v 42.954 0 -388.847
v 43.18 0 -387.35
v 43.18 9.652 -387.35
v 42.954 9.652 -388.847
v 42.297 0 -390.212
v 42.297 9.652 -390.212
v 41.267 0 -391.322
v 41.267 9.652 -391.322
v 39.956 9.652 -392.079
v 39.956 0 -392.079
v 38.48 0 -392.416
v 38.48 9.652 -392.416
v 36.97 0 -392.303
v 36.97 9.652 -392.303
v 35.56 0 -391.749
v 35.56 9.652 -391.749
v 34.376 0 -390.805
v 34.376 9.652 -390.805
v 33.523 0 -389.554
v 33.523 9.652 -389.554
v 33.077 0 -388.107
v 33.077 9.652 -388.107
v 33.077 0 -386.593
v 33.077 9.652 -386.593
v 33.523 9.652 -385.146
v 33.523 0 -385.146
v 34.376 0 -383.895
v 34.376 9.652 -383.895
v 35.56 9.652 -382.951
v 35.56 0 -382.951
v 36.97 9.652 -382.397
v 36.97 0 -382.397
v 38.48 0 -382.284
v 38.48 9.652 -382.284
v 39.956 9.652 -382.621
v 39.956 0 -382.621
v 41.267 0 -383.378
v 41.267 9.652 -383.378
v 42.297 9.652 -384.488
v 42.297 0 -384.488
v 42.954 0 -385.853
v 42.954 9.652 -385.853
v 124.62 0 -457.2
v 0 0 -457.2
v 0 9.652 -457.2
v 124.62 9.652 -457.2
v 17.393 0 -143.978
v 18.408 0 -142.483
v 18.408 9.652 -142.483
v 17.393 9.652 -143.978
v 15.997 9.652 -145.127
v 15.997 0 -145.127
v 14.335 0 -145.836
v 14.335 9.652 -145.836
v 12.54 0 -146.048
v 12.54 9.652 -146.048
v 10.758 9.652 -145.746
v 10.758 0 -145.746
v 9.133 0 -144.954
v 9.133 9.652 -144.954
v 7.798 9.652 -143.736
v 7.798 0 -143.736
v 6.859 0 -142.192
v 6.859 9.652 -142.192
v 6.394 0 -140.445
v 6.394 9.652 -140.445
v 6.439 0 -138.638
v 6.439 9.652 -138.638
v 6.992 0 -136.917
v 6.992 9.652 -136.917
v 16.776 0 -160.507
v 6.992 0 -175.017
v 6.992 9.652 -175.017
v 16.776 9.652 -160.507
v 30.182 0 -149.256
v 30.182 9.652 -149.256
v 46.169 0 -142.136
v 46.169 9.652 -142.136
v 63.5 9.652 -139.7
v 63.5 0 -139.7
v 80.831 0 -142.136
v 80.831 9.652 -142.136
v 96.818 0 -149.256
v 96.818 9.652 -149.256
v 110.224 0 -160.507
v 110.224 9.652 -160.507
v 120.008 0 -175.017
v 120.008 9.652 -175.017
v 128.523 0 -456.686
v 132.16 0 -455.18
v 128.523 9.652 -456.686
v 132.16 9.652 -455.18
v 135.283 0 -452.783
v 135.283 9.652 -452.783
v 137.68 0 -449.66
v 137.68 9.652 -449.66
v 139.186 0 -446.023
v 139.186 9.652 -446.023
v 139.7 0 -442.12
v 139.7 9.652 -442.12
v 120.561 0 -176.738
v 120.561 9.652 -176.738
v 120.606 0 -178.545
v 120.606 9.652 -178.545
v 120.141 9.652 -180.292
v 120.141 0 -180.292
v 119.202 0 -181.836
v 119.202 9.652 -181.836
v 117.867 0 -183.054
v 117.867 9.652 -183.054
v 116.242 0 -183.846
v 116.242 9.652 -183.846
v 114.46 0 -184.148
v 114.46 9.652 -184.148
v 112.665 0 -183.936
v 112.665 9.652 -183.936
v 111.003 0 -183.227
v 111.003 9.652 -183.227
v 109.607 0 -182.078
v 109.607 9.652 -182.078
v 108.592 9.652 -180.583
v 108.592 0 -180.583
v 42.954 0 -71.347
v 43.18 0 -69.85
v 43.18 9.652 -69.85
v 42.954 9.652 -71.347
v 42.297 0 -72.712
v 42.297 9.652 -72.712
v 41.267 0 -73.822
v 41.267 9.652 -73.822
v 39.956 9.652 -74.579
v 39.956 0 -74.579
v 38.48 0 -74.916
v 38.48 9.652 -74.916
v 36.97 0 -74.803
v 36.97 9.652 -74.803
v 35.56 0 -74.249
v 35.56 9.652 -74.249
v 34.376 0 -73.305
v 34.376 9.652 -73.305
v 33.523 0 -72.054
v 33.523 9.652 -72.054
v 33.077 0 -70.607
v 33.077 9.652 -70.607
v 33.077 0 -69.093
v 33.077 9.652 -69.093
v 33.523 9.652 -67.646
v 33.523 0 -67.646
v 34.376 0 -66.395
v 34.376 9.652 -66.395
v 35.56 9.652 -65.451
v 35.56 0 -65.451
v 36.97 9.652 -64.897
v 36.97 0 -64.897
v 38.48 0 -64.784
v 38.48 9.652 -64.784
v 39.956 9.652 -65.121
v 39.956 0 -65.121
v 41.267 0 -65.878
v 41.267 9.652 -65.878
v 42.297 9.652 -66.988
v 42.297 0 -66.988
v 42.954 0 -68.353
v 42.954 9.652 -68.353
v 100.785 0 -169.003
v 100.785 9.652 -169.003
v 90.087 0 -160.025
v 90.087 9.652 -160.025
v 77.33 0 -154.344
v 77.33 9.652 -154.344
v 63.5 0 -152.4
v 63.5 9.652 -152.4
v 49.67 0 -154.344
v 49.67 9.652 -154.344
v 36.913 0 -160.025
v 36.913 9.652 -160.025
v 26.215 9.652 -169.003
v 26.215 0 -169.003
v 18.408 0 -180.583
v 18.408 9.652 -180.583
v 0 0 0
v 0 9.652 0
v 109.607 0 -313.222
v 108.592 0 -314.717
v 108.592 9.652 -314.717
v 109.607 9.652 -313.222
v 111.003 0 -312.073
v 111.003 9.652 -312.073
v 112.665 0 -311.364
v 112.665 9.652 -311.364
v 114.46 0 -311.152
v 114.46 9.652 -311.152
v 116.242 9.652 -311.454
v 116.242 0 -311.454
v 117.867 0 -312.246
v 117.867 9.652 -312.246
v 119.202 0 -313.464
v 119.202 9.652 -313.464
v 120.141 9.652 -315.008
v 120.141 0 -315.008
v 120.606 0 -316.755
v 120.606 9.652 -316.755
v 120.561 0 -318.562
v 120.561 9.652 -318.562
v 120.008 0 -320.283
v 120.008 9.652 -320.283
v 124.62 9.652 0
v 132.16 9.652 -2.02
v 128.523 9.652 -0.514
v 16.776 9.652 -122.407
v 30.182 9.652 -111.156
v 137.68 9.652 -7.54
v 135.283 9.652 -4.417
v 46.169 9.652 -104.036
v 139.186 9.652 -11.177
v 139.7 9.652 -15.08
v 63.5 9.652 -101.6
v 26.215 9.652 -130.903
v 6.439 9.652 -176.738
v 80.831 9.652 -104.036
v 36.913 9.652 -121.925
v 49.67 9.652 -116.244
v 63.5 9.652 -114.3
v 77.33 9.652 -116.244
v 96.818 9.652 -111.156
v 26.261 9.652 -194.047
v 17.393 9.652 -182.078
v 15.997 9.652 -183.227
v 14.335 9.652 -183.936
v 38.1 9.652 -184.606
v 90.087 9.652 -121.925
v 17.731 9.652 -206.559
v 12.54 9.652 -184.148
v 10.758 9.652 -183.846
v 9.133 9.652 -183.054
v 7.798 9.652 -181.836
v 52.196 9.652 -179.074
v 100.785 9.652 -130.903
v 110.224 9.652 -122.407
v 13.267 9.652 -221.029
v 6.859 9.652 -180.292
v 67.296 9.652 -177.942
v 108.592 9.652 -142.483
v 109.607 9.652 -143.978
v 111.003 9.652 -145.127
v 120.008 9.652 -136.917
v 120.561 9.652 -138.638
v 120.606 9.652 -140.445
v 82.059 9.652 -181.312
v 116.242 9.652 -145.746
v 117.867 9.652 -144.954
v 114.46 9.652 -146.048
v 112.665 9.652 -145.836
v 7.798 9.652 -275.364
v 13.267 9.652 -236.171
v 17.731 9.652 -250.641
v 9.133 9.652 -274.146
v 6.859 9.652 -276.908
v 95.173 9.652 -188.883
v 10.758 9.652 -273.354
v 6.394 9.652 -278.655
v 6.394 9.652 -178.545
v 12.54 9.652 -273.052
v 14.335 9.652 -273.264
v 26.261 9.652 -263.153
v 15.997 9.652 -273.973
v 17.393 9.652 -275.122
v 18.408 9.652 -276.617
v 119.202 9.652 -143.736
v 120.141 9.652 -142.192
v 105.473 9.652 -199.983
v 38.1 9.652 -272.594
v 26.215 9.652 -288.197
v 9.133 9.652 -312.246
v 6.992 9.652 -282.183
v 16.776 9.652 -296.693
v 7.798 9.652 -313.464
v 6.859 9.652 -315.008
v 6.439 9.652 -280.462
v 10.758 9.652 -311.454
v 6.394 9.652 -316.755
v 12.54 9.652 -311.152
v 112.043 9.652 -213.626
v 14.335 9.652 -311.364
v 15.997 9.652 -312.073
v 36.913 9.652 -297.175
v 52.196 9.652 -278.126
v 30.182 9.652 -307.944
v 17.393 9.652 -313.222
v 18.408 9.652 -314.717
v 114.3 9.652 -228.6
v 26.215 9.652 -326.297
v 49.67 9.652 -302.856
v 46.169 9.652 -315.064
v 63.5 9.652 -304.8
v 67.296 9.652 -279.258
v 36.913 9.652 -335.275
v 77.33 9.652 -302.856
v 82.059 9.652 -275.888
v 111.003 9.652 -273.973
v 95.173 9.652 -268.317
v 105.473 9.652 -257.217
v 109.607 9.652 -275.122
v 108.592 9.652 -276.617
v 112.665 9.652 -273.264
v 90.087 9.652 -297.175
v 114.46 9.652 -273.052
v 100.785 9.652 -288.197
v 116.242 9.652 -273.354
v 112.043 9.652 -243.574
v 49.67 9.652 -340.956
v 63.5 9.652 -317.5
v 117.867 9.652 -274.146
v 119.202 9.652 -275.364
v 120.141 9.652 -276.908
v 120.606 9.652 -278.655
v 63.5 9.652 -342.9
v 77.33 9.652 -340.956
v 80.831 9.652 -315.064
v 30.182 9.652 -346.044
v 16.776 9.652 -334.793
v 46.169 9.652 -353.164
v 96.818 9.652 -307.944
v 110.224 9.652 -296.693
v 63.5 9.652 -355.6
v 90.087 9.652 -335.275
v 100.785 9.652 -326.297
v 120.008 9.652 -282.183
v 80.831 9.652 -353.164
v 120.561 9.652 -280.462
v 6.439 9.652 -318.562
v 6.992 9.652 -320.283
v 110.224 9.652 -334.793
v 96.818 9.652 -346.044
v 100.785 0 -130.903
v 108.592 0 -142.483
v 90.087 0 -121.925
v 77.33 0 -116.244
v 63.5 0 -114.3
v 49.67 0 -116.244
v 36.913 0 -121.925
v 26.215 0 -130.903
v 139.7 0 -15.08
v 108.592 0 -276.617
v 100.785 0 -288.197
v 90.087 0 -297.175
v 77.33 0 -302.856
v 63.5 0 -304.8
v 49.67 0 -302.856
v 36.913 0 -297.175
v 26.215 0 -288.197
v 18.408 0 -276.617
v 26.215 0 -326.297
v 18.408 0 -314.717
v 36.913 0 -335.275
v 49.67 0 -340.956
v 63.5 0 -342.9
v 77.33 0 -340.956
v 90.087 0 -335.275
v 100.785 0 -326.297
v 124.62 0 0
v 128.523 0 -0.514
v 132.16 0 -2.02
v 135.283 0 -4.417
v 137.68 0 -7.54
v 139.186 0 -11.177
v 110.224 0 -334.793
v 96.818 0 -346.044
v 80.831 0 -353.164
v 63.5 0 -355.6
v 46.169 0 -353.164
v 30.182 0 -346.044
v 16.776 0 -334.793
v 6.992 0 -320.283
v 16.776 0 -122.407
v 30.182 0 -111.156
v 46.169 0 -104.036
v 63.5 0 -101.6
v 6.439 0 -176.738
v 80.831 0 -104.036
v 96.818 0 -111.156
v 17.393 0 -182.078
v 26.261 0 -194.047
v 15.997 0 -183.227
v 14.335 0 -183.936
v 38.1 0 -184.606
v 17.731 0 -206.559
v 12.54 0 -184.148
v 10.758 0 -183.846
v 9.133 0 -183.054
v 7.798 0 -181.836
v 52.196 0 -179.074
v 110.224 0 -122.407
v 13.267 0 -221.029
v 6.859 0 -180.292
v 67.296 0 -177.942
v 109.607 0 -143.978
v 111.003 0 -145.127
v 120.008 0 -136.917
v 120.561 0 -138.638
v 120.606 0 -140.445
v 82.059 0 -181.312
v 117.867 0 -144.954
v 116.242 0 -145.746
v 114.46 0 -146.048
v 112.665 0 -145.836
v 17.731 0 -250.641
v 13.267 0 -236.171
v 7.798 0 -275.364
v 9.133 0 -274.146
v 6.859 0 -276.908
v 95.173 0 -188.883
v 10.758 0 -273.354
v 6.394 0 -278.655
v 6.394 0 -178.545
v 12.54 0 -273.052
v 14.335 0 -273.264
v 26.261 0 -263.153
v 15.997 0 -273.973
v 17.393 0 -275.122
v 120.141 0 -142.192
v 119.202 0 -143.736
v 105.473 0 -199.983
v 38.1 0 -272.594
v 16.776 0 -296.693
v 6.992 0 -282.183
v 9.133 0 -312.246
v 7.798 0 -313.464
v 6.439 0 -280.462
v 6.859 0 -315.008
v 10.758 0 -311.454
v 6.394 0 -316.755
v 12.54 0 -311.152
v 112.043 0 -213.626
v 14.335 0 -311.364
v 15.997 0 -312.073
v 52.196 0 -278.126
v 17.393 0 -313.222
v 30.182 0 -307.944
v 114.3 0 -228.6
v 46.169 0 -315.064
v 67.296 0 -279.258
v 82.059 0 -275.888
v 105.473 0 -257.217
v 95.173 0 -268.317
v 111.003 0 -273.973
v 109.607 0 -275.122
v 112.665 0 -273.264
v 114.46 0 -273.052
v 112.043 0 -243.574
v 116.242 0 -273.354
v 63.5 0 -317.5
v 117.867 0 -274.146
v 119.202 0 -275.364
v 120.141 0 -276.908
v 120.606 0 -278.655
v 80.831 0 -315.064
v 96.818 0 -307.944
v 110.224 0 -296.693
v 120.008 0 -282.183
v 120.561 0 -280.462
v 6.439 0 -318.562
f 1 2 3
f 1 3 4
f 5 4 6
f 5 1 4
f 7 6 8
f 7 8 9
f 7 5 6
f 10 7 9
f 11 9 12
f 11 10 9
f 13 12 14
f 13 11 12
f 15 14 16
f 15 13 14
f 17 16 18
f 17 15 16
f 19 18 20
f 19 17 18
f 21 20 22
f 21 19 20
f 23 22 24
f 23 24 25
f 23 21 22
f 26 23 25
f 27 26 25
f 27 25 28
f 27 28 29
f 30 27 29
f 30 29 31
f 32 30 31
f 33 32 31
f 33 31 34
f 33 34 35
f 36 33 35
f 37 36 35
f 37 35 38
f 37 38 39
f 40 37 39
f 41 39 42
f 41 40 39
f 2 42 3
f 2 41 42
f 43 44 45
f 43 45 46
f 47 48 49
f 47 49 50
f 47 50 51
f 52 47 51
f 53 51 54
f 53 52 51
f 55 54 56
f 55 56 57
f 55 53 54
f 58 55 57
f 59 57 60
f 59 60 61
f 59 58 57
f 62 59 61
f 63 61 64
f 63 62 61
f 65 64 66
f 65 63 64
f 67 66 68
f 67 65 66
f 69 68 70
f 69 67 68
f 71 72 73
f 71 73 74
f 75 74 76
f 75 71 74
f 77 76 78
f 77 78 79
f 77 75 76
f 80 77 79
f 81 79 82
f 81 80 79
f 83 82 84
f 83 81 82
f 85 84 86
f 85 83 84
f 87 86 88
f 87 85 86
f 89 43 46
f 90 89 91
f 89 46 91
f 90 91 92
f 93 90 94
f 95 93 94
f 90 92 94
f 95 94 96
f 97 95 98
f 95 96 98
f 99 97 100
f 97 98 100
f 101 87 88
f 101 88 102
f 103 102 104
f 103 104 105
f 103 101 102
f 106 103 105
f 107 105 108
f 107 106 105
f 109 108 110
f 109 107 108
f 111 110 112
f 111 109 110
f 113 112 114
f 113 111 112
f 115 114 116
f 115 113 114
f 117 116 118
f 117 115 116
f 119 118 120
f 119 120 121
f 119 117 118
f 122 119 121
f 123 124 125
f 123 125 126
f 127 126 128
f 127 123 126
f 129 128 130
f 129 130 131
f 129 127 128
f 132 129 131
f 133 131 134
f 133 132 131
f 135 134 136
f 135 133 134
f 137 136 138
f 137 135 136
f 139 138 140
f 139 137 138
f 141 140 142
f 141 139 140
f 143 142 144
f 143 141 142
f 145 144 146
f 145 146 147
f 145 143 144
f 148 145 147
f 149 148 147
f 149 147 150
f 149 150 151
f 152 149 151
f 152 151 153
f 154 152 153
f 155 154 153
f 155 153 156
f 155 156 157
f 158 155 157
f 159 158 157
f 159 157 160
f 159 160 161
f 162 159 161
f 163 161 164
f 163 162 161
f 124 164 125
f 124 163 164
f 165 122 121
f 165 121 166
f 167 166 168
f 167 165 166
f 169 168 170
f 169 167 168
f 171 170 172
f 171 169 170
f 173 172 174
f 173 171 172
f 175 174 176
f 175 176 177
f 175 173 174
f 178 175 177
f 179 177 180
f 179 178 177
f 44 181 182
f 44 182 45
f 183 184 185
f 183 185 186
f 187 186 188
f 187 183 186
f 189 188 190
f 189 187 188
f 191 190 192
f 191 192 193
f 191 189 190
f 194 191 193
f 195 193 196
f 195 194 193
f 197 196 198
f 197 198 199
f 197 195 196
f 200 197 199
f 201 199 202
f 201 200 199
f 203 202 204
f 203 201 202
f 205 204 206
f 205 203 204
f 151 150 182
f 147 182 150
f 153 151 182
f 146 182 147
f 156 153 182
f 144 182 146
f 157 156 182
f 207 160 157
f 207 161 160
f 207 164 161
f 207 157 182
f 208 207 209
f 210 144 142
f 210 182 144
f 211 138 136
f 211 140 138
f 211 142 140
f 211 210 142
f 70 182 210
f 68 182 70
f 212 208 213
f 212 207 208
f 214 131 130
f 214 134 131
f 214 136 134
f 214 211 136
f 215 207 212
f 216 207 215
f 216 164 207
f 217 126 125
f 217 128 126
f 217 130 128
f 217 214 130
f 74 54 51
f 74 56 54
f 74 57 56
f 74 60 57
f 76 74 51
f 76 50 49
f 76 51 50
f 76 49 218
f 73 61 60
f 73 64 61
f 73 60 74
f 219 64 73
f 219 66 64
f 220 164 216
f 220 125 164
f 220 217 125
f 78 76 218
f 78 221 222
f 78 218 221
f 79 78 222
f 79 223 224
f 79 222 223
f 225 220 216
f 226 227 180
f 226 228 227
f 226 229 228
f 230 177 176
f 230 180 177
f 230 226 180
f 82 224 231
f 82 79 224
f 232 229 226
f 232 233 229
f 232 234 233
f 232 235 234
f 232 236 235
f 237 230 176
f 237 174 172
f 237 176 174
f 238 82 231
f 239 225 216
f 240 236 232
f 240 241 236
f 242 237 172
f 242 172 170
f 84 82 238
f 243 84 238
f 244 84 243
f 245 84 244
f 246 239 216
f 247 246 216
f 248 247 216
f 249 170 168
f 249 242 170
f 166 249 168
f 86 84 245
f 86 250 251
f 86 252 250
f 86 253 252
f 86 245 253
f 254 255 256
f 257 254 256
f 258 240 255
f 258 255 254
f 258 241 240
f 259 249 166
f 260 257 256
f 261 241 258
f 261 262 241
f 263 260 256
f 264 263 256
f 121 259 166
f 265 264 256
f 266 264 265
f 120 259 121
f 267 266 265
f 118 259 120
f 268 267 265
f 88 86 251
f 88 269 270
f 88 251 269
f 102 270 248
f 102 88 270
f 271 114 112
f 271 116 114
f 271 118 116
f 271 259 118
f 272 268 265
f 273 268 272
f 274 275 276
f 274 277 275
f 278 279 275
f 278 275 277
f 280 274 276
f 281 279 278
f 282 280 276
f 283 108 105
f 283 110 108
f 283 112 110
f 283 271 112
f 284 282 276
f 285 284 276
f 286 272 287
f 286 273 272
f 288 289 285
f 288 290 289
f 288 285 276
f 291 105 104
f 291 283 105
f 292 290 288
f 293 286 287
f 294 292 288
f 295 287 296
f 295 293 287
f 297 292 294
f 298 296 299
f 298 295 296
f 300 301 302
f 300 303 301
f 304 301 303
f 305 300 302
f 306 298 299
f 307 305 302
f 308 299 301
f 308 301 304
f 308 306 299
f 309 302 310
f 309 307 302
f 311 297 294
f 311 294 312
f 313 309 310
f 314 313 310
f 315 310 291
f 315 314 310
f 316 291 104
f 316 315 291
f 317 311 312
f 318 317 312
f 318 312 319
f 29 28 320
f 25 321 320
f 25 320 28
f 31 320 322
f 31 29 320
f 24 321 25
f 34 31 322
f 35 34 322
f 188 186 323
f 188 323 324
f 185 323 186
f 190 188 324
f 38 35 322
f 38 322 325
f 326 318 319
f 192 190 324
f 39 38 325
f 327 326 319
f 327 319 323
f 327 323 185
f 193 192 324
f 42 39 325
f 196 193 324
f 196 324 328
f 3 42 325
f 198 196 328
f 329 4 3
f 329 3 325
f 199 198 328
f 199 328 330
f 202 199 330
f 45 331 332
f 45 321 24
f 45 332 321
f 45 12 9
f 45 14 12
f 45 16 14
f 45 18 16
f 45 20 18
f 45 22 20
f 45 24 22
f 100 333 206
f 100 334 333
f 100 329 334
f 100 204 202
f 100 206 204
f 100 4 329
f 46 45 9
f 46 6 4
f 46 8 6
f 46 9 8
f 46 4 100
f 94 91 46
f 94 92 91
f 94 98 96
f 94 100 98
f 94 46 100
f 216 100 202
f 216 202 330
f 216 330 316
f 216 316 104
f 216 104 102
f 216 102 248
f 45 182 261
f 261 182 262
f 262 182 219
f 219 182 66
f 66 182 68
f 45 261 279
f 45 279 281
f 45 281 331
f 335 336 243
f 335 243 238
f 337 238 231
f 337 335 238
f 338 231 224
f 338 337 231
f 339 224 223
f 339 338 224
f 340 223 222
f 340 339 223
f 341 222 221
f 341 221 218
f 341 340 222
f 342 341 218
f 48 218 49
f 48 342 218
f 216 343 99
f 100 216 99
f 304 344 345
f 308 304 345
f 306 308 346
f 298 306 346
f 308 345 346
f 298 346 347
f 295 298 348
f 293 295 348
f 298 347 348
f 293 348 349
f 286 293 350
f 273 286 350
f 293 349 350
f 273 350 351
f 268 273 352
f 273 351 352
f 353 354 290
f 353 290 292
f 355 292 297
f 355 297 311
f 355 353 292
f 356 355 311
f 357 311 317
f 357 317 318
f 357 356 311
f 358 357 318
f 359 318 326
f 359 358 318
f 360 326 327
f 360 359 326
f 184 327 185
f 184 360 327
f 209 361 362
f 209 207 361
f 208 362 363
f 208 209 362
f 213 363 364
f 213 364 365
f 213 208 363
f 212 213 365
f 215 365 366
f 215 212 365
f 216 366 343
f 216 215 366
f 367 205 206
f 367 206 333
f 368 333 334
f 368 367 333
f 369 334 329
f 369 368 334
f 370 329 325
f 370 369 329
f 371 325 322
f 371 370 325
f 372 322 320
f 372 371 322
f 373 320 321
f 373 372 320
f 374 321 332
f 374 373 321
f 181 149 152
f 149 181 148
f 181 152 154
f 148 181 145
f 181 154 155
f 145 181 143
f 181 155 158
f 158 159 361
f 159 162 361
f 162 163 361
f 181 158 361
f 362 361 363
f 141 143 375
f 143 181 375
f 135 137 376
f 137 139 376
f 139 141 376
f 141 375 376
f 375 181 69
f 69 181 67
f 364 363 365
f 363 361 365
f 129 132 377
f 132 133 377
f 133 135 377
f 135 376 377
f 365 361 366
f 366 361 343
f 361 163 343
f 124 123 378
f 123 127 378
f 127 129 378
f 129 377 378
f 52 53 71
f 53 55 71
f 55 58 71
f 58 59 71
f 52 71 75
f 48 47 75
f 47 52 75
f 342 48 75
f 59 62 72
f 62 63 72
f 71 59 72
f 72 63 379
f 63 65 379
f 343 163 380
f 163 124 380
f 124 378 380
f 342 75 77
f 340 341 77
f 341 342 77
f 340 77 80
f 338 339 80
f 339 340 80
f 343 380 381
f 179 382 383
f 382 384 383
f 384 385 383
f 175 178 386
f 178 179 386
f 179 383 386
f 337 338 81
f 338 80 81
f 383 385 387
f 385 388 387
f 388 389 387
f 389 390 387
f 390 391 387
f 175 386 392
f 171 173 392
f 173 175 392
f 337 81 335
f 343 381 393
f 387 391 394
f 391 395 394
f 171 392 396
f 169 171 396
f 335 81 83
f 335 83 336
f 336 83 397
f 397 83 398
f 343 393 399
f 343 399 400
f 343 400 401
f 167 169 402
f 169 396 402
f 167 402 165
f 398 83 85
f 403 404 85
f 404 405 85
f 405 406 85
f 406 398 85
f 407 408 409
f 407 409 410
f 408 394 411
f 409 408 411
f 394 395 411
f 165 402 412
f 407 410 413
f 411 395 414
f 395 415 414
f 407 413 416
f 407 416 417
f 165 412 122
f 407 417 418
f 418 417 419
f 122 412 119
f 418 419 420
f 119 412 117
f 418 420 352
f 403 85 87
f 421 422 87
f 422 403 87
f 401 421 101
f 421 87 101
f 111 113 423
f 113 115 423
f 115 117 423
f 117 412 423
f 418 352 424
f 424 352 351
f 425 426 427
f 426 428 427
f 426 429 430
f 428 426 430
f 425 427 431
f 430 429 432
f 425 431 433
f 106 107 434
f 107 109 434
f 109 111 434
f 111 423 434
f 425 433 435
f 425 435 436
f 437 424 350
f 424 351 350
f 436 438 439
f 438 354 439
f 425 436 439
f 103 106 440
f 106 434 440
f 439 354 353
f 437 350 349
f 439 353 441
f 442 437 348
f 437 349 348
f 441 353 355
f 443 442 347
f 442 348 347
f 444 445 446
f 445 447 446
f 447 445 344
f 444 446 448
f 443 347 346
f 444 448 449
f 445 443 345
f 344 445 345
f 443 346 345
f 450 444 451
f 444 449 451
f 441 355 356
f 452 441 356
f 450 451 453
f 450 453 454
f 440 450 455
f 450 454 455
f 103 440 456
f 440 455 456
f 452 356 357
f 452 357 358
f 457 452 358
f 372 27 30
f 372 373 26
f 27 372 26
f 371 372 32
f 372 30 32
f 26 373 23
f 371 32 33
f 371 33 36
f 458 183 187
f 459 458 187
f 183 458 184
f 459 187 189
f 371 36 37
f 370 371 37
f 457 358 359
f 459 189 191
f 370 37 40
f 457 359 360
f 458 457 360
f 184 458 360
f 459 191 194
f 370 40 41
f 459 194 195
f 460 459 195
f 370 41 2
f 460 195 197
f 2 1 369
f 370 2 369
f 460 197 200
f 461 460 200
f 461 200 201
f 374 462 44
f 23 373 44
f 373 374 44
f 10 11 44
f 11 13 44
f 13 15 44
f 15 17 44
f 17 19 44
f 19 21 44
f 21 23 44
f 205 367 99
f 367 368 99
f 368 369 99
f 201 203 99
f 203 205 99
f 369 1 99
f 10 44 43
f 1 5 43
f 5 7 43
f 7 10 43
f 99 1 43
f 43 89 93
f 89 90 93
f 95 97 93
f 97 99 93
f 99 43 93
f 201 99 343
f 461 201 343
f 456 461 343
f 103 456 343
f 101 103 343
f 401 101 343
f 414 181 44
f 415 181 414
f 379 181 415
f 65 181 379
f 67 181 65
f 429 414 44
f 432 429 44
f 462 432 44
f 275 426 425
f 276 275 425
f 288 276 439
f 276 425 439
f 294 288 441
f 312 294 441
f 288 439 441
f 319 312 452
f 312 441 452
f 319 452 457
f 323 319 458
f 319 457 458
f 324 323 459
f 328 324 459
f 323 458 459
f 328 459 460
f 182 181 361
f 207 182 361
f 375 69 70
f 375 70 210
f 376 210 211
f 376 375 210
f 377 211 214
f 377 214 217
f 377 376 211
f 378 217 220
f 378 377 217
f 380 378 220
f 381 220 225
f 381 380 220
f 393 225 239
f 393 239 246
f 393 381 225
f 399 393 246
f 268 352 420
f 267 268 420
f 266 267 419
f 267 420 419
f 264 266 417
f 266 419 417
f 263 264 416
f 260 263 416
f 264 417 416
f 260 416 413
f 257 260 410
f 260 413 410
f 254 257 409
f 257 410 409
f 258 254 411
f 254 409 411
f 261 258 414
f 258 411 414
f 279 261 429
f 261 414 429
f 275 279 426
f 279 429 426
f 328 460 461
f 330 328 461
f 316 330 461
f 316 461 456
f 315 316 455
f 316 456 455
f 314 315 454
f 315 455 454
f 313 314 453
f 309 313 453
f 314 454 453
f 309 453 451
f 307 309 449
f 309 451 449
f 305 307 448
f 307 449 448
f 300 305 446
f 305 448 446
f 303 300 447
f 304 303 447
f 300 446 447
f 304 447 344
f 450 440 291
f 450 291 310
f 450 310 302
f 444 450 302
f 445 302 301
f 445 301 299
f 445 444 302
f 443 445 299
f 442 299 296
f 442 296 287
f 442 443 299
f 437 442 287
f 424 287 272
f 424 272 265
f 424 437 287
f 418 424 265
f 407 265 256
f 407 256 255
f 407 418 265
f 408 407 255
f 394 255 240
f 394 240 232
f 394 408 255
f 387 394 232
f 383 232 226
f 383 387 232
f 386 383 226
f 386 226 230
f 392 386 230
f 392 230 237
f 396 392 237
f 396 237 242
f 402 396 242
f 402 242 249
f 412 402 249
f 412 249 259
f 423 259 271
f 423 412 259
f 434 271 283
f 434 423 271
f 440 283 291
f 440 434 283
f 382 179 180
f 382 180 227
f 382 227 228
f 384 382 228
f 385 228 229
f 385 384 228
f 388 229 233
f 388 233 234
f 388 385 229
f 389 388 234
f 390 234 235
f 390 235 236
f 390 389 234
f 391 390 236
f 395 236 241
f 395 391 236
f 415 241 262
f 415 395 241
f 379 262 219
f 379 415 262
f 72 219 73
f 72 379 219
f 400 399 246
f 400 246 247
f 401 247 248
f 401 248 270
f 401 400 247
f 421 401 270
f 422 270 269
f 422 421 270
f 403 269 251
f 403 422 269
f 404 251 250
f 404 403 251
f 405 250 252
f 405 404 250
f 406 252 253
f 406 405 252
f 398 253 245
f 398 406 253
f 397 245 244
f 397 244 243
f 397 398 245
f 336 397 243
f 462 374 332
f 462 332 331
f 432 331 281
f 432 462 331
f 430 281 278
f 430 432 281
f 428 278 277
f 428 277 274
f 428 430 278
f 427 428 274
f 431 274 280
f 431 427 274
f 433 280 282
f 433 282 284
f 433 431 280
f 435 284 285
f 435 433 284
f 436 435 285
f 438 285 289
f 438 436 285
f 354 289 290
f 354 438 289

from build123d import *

# Parameters (mm, degrees)
SKETCH1_W           = 139.7
SKETCH1_H           = 457.2
SKETCH1_R           = 50.8
SKETCH1_R_2         = 5.08
BOSS_EXTRUDE1_DEPTH = 9.652
FILLET1_R           = 15.08
CUT_EXTRUDE1_DEPTH  = 9.652


with BuildPart() as part:
    # Sketch1 → Boss-Extrude1 (new body)
    with BuildSketch(Plane(origin=(0, 0, 0), x_dir=(1, 0, 0), z_dir=(0, 1, 0))):
        with Locations((69.85, 228.6)):
            Rectangle(SKETCH1_W, SKETCH1_H)
        with Locations((63.5, 228.6)):
            Circle(SKETCH1_R, mode=Mode.SUBTRACT)
        with Locations((38.1, 69.85)):
            Circle(SKETCH1_R_2, mode=Mode.SUBTRACT)
        with Locations((38.1, 387.35)):
            Circle(SKETCH1_R_2, mode=Mode.SUBTRACT)
    extrude(amount=BOSS_EXTRUDE1_DEPTH)

    # Fillet1
    fillet1_edges = [part.edges().sort_by_distance(p)[0] for p in [
        (139.7, 4.826, -457.2),
        (139.7, 4.826, 0),
    ]]
    fillet(fillet1_edges, radius=FILLET1_R)

    # Sketch3 → Cut-Extrude1 (cut)
    with BuildSketch(Plane.XZ):
        with BuildLine():
            ThreePointArc((18.407865169, -314.71741573), (63.5, -342.9), (108.592134831, -314.71741573))
            ThreePointArc((108.592134831, -314.71741573), (117.08258427, -311.792134831), (120.007865169, -320.28258427))
            ThreePointArc((120.007865169, -320.28258427), (63.5, -355.6), (6.992134831, -320.28258427))
            ThreePointArc((6.992134831, -320.28258427), (9.91741573, -311.792134831), (18.407865169, -314.71741573))
        make_face()
        with BuildLine():
            ThreePointArc((6.992134831, -282.18258427), (63.5, -317.5), (120.007865169, -282.18258427))
            ThreePointArc((120.007865169, -282.18258427), (117.08258427, -273.692134831), (108.592134831, -276.61741573))
            ThreePointArc((108.592134831, -276.61741573), (63.5, -304.8), (18.407865169, -276.61741573))
            ThreePointArc((18.407865169, -276.61741573), (9.91741573, -273.692134831), (6.992134831, -282.18258427))
        make_face()
        with BuildLine():
            ThreePointArc((6.992134831, -136.91741573), (63.5, -101.6), (120.007865169, -136.91741573))
            ThreePointArc((120.007865169, -136.91741573), (117.08258427, -145.407865169), (108.592134831, -142.48258427))
            ThreePointArc((108.592134831, -142.48258427), (63.5, -114.3), (18.407865169, -142.48258427))
            ThreePointArc((18.407865169, -142.48258427), (9.91741573, -145.407865169), (6.992134831, -136.91741573))
        make_face()
        with BuildLine():
            ThreePointArc((6.992134831, -175.01741573), (63.5, -139.7), (120.007865169, -175.01741573))
            ThreePointArc((120.007865169, -175.01741573), (117.08258427, -183.507865169), (108.592134831, -180.58258427))
            ThreePointArc((108.592134831, -180.58258427), (63.5, -152.4), (18.407865169, -180.58258427))
            ThreePointArc((18.407865169, -180.58258427), (9.91741573, -183.507865169), (6.992134831, -175.01741573))
        make_face()
    extrude(amount=-CUT_EXTRUDE1_DEPTH, mode=Mode.SUBTRACT)


solid = part.part
